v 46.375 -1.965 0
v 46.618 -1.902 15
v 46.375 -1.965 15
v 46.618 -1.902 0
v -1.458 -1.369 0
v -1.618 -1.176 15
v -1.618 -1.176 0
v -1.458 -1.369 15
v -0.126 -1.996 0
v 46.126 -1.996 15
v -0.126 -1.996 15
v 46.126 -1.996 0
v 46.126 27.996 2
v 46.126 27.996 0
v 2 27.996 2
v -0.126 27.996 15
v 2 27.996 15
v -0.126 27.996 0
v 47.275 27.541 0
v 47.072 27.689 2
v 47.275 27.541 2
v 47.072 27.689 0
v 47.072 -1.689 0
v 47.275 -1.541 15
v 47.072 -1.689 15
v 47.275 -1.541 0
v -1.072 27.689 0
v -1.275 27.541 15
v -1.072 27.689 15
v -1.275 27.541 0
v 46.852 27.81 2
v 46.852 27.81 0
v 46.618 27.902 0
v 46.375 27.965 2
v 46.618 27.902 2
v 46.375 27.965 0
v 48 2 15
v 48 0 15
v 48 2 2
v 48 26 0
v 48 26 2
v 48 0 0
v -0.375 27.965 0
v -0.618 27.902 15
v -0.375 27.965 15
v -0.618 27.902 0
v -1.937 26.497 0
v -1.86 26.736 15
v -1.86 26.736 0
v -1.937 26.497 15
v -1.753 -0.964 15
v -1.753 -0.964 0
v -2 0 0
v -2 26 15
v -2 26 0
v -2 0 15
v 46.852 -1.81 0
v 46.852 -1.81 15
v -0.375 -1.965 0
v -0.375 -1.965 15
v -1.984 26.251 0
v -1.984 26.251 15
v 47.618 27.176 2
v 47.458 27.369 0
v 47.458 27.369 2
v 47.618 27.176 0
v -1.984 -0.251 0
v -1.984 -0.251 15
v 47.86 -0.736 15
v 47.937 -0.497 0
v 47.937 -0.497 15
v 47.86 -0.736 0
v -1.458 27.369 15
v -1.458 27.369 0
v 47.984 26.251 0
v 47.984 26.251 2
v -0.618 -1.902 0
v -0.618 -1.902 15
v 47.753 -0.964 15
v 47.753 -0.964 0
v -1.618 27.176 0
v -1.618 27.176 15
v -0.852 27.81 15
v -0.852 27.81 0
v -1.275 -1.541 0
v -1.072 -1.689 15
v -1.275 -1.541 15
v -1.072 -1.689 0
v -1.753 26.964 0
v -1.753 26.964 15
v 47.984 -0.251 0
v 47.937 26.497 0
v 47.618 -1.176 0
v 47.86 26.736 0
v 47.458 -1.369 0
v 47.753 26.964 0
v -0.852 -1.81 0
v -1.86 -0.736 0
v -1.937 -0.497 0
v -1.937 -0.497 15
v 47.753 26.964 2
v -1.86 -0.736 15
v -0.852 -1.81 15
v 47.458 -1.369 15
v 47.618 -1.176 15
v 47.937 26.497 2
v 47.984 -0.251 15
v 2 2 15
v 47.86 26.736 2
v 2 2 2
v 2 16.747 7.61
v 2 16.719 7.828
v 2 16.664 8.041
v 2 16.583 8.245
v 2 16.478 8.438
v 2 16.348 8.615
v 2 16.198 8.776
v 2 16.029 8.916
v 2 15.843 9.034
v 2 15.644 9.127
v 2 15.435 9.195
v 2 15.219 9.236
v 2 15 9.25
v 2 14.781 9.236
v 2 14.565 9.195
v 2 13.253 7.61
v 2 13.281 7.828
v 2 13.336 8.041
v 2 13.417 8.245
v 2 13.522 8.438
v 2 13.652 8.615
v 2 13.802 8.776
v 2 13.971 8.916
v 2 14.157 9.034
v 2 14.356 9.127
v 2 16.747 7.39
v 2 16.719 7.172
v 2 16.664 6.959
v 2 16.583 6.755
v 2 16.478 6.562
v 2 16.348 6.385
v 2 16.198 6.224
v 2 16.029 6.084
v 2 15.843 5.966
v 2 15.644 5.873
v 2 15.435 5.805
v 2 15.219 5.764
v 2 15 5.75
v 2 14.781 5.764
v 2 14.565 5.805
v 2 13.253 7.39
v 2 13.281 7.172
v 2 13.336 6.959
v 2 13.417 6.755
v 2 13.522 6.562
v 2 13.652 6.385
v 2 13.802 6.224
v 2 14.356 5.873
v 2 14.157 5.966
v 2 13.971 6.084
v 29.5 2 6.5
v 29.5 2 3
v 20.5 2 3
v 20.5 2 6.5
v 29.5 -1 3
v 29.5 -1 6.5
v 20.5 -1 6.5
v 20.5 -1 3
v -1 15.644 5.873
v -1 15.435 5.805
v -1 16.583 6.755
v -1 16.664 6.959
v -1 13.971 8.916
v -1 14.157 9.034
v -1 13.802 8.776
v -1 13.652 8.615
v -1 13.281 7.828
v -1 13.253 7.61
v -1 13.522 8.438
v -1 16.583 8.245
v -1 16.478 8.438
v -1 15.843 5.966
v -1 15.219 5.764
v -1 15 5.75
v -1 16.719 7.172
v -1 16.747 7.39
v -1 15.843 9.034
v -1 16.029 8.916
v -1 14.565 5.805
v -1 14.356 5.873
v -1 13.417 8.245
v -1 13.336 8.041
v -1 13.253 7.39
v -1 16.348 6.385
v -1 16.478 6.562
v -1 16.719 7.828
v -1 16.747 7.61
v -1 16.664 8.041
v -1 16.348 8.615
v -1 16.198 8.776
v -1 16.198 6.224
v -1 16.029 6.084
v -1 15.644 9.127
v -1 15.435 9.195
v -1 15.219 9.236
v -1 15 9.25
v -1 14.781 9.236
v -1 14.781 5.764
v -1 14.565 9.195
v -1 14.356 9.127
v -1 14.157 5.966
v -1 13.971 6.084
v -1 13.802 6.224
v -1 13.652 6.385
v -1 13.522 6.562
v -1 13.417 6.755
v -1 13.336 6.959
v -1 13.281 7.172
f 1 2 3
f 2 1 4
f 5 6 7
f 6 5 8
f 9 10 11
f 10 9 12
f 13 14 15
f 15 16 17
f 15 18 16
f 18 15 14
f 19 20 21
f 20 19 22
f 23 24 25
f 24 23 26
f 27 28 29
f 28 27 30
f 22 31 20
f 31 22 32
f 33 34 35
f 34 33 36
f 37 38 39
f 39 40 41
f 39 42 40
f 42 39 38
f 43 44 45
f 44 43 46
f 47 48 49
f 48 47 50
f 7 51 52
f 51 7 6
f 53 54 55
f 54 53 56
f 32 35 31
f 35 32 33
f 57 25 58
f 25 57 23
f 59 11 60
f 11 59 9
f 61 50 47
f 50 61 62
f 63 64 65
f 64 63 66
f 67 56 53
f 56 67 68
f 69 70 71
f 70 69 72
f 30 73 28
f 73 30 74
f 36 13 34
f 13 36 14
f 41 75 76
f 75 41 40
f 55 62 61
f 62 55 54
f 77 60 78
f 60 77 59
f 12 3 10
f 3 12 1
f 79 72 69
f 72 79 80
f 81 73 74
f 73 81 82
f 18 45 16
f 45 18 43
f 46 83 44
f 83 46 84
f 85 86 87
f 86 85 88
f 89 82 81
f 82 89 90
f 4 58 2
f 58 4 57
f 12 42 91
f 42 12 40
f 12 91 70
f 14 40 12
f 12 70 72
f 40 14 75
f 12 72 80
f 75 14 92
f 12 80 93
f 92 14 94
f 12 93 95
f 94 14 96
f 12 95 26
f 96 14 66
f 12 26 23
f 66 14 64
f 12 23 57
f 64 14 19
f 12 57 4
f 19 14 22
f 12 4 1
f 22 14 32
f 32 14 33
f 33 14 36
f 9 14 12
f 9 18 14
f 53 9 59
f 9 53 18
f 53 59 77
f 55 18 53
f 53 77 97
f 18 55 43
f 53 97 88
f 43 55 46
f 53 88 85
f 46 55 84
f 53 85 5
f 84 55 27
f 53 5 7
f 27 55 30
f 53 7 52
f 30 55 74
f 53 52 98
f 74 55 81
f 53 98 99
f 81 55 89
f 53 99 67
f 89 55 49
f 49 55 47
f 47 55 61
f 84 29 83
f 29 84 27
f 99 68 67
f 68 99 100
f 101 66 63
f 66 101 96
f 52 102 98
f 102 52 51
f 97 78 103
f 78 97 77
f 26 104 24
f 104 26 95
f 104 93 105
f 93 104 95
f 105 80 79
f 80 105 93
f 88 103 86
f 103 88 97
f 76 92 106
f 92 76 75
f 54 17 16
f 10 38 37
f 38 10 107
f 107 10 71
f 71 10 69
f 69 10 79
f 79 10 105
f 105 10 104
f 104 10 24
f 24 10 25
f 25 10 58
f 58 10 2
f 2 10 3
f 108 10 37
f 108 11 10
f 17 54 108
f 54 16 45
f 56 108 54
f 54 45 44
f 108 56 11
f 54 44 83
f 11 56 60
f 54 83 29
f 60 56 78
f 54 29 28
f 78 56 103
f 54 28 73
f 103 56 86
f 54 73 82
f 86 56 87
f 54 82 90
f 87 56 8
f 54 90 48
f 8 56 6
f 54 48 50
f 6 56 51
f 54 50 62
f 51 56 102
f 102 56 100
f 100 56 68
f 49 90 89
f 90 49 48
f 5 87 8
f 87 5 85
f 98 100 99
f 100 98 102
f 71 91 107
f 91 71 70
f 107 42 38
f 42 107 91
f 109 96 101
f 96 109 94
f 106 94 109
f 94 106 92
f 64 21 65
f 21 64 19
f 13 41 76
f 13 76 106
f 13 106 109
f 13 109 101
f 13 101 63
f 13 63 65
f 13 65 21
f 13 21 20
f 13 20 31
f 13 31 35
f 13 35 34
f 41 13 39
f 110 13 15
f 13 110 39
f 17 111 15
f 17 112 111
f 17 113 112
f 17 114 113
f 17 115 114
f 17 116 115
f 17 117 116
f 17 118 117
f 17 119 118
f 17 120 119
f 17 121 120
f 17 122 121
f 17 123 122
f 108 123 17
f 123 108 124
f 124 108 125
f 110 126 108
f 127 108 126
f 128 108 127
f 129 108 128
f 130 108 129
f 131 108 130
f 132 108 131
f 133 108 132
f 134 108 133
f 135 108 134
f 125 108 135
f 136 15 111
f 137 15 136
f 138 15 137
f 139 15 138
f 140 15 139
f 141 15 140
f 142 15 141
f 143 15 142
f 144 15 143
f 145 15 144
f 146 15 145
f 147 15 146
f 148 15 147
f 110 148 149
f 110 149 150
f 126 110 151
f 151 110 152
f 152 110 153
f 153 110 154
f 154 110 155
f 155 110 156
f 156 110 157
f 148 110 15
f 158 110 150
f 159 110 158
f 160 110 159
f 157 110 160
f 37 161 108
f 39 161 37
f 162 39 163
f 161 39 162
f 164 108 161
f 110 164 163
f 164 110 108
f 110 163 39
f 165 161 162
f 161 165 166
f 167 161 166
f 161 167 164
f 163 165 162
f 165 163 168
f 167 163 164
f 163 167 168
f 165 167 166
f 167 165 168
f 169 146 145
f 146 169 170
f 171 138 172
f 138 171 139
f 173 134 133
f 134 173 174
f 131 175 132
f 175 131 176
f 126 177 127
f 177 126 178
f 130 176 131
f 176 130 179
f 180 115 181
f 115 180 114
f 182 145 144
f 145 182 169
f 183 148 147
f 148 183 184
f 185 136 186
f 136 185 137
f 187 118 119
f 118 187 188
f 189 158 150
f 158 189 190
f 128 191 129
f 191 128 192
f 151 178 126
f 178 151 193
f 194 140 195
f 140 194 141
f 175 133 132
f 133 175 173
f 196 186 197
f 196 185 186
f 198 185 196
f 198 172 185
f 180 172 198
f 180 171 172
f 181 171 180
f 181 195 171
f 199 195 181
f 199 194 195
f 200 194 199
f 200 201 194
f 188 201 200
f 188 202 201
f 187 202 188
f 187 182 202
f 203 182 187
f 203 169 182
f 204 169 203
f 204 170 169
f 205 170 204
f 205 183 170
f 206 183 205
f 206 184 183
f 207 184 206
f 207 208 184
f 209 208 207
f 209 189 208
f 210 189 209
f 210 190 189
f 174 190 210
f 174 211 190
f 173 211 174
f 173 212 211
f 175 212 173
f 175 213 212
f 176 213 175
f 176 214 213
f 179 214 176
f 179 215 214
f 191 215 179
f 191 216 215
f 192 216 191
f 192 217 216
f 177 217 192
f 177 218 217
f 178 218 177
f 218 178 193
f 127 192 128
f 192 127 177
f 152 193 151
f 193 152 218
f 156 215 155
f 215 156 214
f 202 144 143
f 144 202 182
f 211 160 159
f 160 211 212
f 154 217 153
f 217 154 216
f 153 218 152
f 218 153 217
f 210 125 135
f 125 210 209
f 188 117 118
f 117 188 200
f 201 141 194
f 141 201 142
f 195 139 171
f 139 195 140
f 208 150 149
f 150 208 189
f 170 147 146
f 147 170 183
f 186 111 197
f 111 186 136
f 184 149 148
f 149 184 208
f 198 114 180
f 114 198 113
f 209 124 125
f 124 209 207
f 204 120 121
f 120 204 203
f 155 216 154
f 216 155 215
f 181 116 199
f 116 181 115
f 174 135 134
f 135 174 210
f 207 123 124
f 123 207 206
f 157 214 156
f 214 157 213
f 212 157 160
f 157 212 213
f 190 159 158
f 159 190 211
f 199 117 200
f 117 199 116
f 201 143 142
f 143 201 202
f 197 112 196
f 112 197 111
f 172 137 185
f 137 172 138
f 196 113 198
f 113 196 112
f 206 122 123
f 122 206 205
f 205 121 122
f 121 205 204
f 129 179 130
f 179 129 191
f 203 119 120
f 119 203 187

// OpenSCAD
wall_thickness = 2;     // 壁厚
length = 50;            // 外长
width = 30;             // 外宽
height = 15;            // 外高
chamfer = 2;            // 倒角半径（圆角）

module base() {
    difference() {
        // 外盒 + 倒角
        minkowski() {
            cube([length - 2*chamfer, width - 2*chamfer, height - chamfer]);
            cylinder(r=chamfer, h=chamfer, $fn=50);
        }
        
        // 内腔（比外盒大一些以补偿minkowski膨胀）
        translate([wall_thickness, wall_thickness, wall_thickness])
            cube([length + 2*chamfer - 2*wall_thickness, width + 2*chamfer - 2*wall_thickness, height]);
        
        // Type-C 充电插口（前侧面，底部居中）
        translate([(length - 9)/2, -1, wall_thickness + 1])
            cube([9, wall_thickness + 2, 3.5]);
        
        // 重剑3-pin插口（右侧面，中间高度）——三个圆孔
        translate([length + 1, width/2, height/2]) 
            rotate([0, 90, 0]) {
                // 中间 B 孔
                cylinder(h = wall_thickness + 2, d = 4, $fn=50);
                // 左侧 A 孔（距中心15mm）
                translate([-15, 0, 0])
                    cylinder(h = wall_thickness + 2, d = 4, $fn=50);
                // 右侧 C 孔（距中心20mm）
                translate([20, 0, 0])
                    cylinder(h = wall_thickness + 2, d = 4, $fn=50);
            }
        
        // 第三个预留插口（后侧面，底部居中）
        translate([(length - 10)/2, width - wall_thickness -1, wall_thickness + 1])
            cube([10, wall_thickness + 2, 4]);
        
        // 重置按钮孔（左侧面，中间）
        translate([-1, width/2, height/2])
            rotate([0, 90, 0])
            cylinder(h=wall_thickness + 2, d=3.5, $fn=50);
        
        // 两个灯位孔（顶部）
        translate([length/4, width/2, height -1])
            cylinder(h=wall_thickness + 2, d=5, $fn=50);
        translate([3*length/4, width/2, height -1])
            cylinder(h=wall_thickness + 2, d=5, $fn=50);
        
        // 蜂鸣器格栅（顶部，5个小孔）
        for (i = [0:4]) {
            translate([length - 12 - i*3, width/4, height -1])
                cylinder(h=wall_thickness + 2, d=2, $fn=50);
        }
    }
}

// 生成模型
base();
